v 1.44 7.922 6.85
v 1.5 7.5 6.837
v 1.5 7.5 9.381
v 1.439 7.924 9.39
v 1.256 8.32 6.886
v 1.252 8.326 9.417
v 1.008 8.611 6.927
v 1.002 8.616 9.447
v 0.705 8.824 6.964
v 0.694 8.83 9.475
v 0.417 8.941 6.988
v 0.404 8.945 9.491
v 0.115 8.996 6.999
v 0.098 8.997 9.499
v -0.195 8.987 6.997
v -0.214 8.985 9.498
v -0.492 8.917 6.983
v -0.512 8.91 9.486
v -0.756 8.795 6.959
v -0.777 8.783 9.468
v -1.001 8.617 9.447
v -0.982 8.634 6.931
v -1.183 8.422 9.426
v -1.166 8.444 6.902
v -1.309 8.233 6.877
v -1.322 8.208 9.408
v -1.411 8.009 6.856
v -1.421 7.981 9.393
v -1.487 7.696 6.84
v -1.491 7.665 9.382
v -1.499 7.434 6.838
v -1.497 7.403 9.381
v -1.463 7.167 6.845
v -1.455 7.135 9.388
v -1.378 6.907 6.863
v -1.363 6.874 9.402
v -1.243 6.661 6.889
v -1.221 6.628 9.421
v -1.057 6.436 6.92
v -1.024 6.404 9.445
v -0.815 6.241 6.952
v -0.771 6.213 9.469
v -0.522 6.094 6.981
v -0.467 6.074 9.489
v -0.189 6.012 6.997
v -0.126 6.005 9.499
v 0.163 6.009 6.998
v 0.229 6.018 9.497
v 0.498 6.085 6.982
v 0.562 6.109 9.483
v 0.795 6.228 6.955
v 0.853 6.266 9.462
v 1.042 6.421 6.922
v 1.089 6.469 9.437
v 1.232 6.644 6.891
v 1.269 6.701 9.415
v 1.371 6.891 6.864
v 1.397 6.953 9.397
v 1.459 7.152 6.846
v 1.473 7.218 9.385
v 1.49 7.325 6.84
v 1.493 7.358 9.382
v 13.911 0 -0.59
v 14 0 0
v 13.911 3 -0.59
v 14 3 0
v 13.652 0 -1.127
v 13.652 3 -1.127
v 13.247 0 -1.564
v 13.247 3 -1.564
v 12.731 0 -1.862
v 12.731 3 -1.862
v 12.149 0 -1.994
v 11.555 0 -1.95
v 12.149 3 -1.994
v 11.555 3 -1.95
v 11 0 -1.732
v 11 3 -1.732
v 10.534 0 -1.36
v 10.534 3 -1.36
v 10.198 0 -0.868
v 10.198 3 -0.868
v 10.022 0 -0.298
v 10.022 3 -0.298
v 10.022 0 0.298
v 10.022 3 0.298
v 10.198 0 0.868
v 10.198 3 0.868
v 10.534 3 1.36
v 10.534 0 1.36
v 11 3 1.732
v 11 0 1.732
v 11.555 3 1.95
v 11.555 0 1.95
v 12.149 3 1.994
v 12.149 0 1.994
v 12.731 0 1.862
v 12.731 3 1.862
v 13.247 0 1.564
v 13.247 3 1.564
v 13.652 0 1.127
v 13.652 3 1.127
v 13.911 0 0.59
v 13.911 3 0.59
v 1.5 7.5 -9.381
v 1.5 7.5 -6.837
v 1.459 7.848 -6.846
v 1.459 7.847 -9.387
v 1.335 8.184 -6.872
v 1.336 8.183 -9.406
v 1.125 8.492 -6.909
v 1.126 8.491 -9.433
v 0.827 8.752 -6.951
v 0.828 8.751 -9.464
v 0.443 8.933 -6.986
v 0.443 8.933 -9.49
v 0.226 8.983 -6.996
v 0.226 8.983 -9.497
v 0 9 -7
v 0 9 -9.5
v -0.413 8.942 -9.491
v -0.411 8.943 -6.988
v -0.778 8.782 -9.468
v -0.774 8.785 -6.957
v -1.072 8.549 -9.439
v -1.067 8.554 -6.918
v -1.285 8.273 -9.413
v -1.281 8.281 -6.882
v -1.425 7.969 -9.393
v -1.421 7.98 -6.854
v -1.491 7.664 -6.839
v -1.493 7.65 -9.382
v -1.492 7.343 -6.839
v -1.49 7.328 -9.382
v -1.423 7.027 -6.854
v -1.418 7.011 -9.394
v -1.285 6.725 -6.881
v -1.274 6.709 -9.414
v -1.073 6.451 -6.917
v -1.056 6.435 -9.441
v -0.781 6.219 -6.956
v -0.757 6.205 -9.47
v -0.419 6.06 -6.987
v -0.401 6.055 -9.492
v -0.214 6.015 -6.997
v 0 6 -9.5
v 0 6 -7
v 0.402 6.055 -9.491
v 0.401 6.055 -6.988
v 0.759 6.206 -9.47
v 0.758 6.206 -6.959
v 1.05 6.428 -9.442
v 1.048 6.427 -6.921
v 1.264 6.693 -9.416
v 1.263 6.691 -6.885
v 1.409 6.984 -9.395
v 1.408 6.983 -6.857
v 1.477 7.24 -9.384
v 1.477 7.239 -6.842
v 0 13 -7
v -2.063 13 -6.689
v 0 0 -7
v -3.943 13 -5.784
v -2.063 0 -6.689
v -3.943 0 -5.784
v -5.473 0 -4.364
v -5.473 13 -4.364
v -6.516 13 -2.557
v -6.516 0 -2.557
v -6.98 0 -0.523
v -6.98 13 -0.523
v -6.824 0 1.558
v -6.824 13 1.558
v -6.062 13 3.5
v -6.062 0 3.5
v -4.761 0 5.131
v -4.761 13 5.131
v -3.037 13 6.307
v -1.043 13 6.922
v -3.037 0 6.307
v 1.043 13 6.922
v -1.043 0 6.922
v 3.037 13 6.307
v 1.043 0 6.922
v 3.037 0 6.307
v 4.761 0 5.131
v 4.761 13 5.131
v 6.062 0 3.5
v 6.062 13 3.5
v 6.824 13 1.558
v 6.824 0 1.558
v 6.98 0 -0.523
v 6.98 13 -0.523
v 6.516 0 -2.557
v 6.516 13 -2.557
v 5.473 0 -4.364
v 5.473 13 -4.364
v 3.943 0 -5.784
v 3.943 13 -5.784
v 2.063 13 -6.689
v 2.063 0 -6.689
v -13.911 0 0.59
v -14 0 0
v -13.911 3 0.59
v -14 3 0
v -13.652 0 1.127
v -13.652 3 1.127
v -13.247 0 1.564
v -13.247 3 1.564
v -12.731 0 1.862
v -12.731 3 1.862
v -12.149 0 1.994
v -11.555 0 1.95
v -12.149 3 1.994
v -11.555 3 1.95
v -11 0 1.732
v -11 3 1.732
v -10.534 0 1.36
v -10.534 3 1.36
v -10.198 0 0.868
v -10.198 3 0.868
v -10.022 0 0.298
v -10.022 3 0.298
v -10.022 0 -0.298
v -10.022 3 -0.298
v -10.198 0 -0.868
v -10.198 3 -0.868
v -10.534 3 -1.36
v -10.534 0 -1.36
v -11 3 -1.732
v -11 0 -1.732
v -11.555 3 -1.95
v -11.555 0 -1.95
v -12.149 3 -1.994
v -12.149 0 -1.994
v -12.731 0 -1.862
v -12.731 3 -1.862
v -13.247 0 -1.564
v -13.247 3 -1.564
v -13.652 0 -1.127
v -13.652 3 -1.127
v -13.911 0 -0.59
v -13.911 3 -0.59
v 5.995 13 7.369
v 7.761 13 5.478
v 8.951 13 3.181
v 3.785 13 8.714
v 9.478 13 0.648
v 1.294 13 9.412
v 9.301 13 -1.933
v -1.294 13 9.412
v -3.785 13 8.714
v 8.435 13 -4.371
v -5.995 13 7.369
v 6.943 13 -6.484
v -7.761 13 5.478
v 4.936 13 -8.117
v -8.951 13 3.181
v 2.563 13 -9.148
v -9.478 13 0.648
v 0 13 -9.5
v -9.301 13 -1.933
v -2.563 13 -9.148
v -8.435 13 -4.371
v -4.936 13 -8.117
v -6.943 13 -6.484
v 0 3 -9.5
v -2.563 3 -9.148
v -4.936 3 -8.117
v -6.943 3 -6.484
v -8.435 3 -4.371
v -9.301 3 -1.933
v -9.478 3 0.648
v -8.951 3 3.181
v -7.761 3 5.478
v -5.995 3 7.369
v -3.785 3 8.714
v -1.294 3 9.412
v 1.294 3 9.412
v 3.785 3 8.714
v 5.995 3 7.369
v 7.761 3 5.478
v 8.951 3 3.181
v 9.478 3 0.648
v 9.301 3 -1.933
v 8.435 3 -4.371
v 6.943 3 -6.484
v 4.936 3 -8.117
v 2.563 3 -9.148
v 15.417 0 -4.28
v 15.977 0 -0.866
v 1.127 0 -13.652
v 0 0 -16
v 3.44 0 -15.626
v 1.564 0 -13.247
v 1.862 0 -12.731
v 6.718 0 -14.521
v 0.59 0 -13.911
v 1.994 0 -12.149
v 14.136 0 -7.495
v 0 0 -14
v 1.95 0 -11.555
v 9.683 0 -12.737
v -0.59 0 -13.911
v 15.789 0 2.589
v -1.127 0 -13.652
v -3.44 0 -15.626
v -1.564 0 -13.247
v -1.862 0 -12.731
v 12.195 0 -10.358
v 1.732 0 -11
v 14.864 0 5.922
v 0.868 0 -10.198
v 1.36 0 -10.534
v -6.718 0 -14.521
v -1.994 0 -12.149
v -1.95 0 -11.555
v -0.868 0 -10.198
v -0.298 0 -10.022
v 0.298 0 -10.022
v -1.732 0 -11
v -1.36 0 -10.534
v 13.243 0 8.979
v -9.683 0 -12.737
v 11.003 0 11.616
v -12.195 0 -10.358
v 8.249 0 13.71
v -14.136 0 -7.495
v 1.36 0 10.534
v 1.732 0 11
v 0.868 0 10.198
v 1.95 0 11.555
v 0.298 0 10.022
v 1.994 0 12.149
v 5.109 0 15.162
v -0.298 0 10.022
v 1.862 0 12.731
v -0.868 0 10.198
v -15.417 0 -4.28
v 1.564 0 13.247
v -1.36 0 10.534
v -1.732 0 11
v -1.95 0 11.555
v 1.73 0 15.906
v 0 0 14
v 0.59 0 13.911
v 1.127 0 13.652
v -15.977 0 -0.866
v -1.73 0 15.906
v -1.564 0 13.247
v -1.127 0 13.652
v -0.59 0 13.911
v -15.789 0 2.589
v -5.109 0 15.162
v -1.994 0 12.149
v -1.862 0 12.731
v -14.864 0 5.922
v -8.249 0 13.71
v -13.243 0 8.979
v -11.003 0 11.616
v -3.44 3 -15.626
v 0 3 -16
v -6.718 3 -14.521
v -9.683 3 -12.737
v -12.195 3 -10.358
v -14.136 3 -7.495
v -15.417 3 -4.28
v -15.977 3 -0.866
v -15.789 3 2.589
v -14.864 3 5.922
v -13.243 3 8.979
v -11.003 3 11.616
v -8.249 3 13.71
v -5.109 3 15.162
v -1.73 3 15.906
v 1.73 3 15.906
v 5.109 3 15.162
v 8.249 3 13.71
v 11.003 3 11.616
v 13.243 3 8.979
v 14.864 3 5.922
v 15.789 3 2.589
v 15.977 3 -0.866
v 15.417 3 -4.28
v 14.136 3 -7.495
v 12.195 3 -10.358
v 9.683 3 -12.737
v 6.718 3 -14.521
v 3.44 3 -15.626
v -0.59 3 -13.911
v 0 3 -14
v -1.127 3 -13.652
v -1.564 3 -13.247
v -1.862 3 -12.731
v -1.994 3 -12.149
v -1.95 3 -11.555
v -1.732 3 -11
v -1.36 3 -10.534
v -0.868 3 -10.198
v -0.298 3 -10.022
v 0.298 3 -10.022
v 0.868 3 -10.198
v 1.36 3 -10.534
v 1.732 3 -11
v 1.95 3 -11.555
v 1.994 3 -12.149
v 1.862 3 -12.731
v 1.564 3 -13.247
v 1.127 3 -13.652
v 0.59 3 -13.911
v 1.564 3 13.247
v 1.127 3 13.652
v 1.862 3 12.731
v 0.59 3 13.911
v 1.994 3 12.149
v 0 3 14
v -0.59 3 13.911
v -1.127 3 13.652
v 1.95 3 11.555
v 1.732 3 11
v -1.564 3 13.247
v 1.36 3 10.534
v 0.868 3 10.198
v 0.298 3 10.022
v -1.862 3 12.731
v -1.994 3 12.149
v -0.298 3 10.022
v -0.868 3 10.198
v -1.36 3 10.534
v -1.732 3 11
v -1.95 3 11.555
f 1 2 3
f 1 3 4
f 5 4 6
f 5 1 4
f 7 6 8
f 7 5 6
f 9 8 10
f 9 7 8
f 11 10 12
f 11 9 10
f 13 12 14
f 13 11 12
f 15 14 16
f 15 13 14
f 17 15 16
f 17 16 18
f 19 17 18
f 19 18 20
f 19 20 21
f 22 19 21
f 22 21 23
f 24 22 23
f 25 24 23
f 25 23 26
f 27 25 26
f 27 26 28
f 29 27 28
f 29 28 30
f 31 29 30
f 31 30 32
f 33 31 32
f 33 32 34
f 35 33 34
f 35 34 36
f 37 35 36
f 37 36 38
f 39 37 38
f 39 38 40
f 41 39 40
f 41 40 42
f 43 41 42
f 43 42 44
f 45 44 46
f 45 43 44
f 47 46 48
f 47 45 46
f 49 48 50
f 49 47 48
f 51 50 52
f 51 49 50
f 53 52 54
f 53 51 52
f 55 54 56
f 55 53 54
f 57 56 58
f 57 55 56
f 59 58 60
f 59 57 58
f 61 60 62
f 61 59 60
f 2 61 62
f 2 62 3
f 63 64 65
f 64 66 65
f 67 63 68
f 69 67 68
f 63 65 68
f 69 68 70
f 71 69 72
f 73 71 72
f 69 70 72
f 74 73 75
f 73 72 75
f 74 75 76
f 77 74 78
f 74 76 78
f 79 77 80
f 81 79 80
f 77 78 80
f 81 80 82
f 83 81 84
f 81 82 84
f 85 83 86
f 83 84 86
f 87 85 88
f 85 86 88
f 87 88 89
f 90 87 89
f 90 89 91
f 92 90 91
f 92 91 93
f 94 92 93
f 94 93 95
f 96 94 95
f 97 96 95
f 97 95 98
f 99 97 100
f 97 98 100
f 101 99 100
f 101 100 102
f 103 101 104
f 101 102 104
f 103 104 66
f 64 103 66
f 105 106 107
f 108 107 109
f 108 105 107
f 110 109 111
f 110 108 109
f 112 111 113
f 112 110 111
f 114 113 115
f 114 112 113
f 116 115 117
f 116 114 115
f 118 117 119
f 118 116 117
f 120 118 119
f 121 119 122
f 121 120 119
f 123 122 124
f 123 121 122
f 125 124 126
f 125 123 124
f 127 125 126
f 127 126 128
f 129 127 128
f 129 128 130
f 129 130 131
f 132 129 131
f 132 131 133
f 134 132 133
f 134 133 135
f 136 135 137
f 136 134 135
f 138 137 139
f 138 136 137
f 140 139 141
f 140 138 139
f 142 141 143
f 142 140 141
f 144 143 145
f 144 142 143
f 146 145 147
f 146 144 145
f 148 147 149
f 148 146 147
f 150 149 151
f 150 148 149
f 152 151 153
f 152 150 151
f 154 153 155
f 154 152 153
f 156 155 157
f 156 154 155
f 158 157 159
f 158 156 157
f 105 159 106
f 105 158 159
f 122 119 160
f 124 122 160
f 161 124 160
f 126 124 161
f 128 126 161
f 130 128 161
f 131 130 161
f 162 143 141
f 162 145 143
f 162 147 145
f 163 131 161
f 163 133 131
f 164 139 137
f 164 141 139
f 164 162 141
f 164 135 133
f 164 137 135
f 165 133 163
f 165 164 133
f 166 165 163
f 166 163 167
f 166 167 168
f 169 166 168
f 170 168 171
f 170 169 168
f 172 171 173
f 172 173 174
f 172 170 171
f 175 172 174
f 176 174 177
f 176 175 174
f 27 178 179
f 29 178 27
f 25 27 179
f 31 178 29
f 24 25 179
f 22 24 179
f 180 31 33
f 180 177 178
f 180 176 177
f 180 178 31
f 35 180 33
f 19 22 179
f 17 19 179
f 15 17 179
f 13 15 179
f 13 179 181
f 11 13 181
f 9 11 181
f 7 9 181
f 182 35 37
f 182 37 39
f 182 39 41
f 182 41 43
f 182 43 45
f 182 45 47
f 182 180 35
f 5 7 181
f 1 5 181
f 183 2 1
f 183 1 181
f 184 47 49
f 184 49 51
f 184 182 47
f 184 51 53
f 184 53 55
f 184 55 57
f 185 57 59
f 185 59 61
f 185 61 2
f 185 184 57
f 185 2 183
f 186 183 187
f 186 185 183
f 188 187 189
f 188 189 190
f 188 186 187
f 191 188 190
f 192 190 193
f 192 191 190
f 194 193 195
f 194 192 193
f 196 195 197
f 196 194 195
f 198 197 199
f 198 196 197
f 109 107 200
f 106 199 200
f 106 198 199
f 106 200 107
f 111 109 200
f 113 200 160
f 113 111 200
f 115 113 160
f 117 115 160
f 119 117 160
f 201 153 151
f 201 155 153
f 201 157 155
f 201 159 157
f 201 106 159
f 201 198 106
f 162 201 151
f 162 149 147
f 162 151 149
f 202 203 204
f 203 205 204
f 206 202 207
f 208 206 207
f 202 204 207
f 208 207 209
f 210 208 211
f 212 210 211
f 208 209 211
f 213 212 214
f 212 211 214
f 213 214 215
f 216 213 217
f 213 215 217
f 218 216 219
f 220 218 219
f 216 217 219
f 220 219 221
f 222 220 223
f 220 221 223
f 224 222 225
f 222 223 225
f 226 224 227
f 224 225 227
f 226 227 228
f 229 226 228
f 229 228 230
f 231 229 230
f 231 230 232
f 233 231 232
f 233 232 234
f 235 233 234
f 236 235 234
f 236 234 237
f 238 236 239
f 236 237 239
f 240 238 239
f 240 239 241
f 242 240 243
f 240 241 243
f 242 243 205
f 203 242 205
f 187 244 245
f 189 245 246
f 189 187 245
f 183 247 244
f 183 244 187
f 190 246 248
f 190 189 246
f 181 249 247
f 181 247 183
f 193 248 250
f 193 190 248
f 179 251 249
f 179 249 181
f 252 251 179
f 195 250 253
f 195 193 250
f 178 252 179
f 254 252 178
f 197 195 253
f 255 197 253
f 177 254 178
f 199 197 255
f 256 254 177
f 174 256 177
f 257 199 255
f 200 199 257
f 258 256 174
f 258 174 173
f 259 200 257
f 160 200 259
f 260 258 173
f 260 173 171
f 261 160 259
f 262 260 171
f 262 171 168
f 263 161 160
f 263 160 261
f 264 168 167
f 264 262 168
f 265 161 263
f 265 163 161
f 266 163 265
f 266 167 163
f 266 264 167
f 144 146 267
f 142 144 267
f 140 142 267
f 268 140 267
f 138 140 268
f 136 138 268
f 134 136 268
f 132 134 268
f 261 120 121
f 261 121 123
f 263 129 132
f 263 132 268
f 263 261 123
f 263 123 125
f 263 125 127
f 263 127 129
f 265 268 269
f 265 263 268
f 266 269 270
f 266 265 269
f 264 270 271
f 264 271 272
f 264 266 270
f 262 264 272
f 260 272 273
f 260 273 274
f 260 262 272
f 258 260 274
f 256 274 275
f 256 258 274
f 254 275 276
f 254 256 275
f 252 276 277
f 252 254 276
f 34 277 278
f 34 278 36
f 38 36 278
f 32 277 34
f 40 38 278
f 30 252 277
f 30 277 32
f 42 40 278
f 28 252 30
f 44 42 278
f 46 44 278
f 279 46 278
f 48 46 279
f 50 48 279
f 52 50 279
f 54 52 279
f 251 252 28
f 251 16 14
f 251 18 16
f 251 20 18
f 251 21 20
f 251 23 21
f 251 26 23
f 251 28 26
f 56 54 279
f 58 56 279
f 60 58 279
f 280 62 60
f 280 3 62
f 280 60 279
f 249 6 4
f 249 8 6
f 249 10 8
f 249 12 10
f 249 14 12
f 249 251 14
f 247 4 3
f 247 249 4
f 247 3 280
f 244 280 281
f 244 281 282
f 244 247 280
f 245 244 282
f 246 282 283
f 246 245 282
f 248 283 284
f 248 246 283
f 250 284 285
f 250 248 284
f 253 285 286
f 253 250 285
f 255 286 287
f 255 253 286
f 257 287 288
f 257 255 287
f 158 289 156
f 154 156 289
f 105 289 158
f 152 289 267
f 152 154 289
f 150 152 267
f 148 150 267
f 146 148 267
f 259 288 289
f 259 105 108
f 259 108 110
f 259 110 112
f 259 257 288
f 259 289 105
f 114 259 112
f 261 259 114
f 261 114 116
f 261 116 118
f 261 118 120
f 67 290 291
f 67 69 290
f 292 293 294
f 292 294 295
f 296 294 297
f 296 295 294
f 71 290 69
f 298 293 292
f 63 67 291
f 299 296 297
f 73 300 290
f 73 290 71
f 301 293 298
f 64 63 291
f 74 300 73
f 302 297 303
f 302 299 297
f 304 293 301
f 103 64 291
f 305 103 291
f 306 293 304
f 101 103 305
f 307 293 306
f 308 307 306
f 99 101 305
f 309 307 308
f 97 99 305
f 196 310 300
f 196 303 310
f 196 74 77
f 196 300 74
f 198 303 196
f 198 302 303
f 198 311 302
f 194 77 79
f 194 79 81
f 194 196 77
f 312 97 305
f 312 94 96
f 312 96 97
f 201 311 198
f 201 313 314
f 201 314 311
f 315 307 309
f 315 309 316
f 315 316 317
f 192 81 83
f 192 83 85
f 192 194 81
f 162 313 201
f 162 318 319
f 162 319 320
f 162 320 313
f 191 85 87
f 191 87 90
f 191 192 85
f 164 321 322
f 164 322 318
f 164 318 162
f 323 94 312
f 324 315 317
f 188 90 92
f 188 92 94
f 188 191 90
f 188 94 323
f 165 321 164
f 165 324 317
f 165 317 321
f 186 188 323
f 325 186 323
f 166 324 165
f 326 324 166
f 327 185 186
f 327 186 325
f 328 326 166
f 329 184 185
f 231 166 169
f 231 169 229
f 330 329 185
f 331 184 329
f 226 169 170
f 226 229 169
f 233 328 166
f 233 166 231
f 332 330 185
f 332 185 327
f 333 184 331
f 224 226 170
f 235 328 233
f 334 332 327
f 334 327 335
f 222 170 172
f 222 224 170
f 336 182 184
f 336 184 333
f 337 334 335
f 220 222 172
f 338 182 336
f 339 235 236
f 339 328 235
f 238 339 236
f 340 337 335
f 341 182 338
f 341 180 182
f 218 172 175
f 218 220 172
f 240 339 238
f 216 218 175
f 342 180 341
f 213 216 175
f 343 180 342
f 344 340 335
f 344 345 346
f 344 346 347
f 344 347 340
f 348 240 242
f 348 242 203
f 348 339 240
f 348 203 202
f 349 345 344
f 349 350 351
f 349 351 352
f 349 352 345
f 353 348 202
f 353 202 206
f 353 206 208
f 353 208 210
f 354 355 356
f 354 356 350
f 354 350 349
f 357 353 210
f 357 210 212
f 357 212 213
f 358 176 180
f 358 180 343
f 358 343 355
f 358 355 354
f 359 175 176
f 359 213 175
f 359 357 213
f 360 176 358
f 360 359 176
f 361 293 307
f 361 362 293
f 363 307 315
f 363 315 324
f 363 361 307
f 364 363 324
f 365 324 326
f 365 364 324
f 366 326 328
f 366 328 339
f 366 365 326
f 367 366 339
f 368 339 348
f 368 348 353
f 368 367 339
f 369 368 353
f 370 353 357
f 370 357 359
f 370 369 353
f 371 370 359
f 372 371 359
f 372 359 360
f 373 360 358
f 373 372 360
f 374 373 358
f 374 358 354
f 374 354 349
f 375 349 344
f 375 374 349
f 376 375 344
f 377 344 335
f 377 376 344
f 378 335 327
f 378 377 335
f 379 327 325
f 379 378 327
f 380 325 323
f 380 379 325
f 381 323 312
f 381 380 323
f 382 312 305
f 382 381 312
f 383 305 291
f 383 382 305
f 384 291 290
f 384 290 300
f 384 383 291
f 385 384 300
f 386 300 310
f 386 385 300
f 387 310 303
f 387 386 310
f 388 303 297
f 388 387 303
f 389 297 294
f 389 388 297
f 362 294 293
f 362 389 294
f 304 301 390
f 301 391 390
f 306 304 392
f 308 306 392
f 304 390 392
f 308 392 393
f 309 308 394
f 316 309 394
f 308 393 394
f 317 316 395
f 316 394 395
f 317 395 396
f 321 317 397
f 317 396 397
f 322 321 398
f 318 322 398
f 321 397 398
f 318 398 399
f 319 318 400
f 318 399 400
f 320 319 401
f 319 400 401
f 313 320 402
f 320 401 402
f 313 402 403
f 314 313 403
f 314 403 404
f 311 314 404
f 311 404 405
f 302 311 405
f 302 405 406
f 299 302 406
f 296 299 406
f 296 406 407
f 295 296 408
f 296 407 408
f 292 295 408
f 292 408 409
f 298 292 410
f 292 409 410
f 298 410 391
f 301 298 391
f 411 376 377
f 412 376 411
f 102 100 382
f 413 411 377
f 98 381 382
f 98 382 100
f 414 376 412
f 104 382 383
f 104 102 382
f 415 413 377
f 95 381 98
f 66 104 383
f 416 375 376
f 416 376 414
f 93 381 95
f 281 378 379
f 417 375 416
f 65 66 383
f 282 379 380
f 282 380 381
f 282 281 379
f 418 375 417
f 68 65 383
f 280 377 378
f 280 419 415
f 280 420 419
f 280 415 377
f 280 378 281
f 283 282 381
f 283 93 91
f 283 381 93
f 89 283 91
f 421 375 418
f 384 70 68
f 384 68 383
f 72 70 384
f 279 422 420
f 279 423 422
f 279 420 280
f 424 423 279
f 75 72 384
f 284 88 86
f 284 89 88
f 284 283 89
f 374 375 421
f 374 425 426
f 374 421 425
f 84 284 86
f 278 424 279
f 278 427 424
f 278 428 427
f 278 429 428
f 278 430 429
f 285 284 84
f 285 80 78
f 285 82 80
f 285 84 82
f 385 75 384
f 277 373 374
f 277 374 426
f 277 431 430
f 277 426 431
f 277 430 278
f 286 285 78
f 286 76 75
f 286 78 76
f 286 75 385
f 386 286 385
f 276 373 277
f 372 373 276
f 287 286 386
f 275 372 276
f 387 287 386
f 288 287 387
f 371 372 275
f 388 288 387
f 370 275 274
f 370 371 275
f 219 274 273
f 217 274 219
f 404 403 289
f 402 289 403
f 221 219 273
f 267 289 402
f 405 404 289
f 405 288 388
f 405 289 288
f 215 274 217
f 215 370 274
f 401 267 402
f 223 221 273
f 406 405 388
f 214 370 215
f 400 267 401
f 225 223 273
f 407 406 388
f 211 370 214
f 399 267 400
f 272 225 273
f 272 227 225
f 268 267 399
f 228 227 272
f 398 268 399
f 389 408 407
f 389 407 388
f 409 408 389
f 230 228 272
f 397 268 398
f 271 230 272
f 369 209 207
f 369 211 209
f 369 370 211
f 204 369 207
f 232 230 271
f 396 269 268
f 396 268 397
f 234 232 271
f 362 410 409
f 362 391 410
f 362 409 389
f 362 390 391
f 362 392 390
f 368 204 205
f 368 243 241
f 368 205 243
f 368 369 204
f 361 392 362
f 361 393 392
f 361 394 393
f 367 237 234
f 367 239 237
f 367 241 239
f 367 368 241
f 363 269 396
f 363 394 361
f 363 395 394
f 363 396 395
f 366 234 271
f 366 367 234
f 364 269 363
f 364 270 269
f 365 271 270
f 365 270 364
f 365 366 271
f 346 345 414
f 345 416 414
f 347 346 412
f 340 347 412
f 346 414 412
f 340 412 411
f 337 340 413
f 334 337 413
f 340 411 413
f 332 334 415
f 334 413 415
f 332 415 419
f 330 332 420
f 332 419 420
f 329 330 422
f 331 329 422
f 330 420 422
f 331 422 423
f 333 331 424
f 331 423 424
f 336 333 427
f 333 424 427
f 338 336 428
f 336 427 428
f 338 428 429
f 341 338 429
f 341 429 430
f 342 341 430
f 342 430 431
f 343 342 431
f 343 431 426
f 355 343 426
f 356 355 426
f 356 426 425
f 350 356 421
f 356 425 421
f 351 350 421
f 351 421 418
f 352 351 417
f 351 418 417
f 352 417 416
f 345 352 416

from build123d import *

# Parameters (mm, degrees)
CUT_EXTRUDE1_DEPTH      = 27.095976701
CUT_EXTRUDE1_DEPTH_BACK = 27.095976701
SKETCH2_R               = 1.5
SKETCH3_R               = 2
CUT_EXTRUDE2_DEPTH      = 25.738633794
CIRPATTERN1_COUNT       = 4


with BuildPart() as part:
    # Sketch1 → Revolve1 (revolve)
    with BuildSketch(Plane(origin=(0, 0, 0), x_dir=(0, 0, -1), z_dir=(1, 0, 0)), mode=Mode.PRIVATE) as revolve1_sk:
        Polygon((-7, 0), (-16, 0), (-16, 3), (-9.5, 3), (-9.5, 13), (-7, 13), align=None)
    revolve(revolve1_sk.sketch.rotate(Axis((0, 0, 0), (0, 1, 0)), 180), axis=Axis((0, 0, 0), (0, 1, 0)))

    # Sketch2 → Cut-Extrude1 (cut, two sides: drawn at the far end of the back side and taken through both)
    with BuildSketch(Plane.XY.offset(-CUT_EXTRUDE1_DEPTH_BACK)):
        with Locations((0, 7.5)):
            Circle(SKETCH2_R)
    extrude(amount=CUT_EXTRUDE1_DEPTH + CUT_EXTRUDE1_DEPTH_BACK, mode=Mode.SUBTRACT)

    # Sketch3 → Cut-Extrude2 (cut, symmetric)
    with BuildSketch(Plane(origin=(0, 3, 0), x_dir=(1, 0, 0), z_dir=(0, 1, 0))):
        with Locations(Location((0, -12, 0), (0, 0, 270))):
            Circle(SKETCH3_R)
    cut_extrude2 = extrude(amount=CUT_EXTRUDE2_DEPTH, both=True, mode=Mode.SUBTRACT)

    # CirPattern1: Cut-Extrude2 ×4 about axis
    cirpattern1_axis = Axis((0, 0, 0), (0, 1, 0))
    for i in range(1, CIRPATTERN1_COUNT):
        add(cut_extrude2.rotate(cirpattern1_axis, i * 360 / CIRPATTERN1_COUNT), mode=Mode.SUBTRACT)


solid = part.part
